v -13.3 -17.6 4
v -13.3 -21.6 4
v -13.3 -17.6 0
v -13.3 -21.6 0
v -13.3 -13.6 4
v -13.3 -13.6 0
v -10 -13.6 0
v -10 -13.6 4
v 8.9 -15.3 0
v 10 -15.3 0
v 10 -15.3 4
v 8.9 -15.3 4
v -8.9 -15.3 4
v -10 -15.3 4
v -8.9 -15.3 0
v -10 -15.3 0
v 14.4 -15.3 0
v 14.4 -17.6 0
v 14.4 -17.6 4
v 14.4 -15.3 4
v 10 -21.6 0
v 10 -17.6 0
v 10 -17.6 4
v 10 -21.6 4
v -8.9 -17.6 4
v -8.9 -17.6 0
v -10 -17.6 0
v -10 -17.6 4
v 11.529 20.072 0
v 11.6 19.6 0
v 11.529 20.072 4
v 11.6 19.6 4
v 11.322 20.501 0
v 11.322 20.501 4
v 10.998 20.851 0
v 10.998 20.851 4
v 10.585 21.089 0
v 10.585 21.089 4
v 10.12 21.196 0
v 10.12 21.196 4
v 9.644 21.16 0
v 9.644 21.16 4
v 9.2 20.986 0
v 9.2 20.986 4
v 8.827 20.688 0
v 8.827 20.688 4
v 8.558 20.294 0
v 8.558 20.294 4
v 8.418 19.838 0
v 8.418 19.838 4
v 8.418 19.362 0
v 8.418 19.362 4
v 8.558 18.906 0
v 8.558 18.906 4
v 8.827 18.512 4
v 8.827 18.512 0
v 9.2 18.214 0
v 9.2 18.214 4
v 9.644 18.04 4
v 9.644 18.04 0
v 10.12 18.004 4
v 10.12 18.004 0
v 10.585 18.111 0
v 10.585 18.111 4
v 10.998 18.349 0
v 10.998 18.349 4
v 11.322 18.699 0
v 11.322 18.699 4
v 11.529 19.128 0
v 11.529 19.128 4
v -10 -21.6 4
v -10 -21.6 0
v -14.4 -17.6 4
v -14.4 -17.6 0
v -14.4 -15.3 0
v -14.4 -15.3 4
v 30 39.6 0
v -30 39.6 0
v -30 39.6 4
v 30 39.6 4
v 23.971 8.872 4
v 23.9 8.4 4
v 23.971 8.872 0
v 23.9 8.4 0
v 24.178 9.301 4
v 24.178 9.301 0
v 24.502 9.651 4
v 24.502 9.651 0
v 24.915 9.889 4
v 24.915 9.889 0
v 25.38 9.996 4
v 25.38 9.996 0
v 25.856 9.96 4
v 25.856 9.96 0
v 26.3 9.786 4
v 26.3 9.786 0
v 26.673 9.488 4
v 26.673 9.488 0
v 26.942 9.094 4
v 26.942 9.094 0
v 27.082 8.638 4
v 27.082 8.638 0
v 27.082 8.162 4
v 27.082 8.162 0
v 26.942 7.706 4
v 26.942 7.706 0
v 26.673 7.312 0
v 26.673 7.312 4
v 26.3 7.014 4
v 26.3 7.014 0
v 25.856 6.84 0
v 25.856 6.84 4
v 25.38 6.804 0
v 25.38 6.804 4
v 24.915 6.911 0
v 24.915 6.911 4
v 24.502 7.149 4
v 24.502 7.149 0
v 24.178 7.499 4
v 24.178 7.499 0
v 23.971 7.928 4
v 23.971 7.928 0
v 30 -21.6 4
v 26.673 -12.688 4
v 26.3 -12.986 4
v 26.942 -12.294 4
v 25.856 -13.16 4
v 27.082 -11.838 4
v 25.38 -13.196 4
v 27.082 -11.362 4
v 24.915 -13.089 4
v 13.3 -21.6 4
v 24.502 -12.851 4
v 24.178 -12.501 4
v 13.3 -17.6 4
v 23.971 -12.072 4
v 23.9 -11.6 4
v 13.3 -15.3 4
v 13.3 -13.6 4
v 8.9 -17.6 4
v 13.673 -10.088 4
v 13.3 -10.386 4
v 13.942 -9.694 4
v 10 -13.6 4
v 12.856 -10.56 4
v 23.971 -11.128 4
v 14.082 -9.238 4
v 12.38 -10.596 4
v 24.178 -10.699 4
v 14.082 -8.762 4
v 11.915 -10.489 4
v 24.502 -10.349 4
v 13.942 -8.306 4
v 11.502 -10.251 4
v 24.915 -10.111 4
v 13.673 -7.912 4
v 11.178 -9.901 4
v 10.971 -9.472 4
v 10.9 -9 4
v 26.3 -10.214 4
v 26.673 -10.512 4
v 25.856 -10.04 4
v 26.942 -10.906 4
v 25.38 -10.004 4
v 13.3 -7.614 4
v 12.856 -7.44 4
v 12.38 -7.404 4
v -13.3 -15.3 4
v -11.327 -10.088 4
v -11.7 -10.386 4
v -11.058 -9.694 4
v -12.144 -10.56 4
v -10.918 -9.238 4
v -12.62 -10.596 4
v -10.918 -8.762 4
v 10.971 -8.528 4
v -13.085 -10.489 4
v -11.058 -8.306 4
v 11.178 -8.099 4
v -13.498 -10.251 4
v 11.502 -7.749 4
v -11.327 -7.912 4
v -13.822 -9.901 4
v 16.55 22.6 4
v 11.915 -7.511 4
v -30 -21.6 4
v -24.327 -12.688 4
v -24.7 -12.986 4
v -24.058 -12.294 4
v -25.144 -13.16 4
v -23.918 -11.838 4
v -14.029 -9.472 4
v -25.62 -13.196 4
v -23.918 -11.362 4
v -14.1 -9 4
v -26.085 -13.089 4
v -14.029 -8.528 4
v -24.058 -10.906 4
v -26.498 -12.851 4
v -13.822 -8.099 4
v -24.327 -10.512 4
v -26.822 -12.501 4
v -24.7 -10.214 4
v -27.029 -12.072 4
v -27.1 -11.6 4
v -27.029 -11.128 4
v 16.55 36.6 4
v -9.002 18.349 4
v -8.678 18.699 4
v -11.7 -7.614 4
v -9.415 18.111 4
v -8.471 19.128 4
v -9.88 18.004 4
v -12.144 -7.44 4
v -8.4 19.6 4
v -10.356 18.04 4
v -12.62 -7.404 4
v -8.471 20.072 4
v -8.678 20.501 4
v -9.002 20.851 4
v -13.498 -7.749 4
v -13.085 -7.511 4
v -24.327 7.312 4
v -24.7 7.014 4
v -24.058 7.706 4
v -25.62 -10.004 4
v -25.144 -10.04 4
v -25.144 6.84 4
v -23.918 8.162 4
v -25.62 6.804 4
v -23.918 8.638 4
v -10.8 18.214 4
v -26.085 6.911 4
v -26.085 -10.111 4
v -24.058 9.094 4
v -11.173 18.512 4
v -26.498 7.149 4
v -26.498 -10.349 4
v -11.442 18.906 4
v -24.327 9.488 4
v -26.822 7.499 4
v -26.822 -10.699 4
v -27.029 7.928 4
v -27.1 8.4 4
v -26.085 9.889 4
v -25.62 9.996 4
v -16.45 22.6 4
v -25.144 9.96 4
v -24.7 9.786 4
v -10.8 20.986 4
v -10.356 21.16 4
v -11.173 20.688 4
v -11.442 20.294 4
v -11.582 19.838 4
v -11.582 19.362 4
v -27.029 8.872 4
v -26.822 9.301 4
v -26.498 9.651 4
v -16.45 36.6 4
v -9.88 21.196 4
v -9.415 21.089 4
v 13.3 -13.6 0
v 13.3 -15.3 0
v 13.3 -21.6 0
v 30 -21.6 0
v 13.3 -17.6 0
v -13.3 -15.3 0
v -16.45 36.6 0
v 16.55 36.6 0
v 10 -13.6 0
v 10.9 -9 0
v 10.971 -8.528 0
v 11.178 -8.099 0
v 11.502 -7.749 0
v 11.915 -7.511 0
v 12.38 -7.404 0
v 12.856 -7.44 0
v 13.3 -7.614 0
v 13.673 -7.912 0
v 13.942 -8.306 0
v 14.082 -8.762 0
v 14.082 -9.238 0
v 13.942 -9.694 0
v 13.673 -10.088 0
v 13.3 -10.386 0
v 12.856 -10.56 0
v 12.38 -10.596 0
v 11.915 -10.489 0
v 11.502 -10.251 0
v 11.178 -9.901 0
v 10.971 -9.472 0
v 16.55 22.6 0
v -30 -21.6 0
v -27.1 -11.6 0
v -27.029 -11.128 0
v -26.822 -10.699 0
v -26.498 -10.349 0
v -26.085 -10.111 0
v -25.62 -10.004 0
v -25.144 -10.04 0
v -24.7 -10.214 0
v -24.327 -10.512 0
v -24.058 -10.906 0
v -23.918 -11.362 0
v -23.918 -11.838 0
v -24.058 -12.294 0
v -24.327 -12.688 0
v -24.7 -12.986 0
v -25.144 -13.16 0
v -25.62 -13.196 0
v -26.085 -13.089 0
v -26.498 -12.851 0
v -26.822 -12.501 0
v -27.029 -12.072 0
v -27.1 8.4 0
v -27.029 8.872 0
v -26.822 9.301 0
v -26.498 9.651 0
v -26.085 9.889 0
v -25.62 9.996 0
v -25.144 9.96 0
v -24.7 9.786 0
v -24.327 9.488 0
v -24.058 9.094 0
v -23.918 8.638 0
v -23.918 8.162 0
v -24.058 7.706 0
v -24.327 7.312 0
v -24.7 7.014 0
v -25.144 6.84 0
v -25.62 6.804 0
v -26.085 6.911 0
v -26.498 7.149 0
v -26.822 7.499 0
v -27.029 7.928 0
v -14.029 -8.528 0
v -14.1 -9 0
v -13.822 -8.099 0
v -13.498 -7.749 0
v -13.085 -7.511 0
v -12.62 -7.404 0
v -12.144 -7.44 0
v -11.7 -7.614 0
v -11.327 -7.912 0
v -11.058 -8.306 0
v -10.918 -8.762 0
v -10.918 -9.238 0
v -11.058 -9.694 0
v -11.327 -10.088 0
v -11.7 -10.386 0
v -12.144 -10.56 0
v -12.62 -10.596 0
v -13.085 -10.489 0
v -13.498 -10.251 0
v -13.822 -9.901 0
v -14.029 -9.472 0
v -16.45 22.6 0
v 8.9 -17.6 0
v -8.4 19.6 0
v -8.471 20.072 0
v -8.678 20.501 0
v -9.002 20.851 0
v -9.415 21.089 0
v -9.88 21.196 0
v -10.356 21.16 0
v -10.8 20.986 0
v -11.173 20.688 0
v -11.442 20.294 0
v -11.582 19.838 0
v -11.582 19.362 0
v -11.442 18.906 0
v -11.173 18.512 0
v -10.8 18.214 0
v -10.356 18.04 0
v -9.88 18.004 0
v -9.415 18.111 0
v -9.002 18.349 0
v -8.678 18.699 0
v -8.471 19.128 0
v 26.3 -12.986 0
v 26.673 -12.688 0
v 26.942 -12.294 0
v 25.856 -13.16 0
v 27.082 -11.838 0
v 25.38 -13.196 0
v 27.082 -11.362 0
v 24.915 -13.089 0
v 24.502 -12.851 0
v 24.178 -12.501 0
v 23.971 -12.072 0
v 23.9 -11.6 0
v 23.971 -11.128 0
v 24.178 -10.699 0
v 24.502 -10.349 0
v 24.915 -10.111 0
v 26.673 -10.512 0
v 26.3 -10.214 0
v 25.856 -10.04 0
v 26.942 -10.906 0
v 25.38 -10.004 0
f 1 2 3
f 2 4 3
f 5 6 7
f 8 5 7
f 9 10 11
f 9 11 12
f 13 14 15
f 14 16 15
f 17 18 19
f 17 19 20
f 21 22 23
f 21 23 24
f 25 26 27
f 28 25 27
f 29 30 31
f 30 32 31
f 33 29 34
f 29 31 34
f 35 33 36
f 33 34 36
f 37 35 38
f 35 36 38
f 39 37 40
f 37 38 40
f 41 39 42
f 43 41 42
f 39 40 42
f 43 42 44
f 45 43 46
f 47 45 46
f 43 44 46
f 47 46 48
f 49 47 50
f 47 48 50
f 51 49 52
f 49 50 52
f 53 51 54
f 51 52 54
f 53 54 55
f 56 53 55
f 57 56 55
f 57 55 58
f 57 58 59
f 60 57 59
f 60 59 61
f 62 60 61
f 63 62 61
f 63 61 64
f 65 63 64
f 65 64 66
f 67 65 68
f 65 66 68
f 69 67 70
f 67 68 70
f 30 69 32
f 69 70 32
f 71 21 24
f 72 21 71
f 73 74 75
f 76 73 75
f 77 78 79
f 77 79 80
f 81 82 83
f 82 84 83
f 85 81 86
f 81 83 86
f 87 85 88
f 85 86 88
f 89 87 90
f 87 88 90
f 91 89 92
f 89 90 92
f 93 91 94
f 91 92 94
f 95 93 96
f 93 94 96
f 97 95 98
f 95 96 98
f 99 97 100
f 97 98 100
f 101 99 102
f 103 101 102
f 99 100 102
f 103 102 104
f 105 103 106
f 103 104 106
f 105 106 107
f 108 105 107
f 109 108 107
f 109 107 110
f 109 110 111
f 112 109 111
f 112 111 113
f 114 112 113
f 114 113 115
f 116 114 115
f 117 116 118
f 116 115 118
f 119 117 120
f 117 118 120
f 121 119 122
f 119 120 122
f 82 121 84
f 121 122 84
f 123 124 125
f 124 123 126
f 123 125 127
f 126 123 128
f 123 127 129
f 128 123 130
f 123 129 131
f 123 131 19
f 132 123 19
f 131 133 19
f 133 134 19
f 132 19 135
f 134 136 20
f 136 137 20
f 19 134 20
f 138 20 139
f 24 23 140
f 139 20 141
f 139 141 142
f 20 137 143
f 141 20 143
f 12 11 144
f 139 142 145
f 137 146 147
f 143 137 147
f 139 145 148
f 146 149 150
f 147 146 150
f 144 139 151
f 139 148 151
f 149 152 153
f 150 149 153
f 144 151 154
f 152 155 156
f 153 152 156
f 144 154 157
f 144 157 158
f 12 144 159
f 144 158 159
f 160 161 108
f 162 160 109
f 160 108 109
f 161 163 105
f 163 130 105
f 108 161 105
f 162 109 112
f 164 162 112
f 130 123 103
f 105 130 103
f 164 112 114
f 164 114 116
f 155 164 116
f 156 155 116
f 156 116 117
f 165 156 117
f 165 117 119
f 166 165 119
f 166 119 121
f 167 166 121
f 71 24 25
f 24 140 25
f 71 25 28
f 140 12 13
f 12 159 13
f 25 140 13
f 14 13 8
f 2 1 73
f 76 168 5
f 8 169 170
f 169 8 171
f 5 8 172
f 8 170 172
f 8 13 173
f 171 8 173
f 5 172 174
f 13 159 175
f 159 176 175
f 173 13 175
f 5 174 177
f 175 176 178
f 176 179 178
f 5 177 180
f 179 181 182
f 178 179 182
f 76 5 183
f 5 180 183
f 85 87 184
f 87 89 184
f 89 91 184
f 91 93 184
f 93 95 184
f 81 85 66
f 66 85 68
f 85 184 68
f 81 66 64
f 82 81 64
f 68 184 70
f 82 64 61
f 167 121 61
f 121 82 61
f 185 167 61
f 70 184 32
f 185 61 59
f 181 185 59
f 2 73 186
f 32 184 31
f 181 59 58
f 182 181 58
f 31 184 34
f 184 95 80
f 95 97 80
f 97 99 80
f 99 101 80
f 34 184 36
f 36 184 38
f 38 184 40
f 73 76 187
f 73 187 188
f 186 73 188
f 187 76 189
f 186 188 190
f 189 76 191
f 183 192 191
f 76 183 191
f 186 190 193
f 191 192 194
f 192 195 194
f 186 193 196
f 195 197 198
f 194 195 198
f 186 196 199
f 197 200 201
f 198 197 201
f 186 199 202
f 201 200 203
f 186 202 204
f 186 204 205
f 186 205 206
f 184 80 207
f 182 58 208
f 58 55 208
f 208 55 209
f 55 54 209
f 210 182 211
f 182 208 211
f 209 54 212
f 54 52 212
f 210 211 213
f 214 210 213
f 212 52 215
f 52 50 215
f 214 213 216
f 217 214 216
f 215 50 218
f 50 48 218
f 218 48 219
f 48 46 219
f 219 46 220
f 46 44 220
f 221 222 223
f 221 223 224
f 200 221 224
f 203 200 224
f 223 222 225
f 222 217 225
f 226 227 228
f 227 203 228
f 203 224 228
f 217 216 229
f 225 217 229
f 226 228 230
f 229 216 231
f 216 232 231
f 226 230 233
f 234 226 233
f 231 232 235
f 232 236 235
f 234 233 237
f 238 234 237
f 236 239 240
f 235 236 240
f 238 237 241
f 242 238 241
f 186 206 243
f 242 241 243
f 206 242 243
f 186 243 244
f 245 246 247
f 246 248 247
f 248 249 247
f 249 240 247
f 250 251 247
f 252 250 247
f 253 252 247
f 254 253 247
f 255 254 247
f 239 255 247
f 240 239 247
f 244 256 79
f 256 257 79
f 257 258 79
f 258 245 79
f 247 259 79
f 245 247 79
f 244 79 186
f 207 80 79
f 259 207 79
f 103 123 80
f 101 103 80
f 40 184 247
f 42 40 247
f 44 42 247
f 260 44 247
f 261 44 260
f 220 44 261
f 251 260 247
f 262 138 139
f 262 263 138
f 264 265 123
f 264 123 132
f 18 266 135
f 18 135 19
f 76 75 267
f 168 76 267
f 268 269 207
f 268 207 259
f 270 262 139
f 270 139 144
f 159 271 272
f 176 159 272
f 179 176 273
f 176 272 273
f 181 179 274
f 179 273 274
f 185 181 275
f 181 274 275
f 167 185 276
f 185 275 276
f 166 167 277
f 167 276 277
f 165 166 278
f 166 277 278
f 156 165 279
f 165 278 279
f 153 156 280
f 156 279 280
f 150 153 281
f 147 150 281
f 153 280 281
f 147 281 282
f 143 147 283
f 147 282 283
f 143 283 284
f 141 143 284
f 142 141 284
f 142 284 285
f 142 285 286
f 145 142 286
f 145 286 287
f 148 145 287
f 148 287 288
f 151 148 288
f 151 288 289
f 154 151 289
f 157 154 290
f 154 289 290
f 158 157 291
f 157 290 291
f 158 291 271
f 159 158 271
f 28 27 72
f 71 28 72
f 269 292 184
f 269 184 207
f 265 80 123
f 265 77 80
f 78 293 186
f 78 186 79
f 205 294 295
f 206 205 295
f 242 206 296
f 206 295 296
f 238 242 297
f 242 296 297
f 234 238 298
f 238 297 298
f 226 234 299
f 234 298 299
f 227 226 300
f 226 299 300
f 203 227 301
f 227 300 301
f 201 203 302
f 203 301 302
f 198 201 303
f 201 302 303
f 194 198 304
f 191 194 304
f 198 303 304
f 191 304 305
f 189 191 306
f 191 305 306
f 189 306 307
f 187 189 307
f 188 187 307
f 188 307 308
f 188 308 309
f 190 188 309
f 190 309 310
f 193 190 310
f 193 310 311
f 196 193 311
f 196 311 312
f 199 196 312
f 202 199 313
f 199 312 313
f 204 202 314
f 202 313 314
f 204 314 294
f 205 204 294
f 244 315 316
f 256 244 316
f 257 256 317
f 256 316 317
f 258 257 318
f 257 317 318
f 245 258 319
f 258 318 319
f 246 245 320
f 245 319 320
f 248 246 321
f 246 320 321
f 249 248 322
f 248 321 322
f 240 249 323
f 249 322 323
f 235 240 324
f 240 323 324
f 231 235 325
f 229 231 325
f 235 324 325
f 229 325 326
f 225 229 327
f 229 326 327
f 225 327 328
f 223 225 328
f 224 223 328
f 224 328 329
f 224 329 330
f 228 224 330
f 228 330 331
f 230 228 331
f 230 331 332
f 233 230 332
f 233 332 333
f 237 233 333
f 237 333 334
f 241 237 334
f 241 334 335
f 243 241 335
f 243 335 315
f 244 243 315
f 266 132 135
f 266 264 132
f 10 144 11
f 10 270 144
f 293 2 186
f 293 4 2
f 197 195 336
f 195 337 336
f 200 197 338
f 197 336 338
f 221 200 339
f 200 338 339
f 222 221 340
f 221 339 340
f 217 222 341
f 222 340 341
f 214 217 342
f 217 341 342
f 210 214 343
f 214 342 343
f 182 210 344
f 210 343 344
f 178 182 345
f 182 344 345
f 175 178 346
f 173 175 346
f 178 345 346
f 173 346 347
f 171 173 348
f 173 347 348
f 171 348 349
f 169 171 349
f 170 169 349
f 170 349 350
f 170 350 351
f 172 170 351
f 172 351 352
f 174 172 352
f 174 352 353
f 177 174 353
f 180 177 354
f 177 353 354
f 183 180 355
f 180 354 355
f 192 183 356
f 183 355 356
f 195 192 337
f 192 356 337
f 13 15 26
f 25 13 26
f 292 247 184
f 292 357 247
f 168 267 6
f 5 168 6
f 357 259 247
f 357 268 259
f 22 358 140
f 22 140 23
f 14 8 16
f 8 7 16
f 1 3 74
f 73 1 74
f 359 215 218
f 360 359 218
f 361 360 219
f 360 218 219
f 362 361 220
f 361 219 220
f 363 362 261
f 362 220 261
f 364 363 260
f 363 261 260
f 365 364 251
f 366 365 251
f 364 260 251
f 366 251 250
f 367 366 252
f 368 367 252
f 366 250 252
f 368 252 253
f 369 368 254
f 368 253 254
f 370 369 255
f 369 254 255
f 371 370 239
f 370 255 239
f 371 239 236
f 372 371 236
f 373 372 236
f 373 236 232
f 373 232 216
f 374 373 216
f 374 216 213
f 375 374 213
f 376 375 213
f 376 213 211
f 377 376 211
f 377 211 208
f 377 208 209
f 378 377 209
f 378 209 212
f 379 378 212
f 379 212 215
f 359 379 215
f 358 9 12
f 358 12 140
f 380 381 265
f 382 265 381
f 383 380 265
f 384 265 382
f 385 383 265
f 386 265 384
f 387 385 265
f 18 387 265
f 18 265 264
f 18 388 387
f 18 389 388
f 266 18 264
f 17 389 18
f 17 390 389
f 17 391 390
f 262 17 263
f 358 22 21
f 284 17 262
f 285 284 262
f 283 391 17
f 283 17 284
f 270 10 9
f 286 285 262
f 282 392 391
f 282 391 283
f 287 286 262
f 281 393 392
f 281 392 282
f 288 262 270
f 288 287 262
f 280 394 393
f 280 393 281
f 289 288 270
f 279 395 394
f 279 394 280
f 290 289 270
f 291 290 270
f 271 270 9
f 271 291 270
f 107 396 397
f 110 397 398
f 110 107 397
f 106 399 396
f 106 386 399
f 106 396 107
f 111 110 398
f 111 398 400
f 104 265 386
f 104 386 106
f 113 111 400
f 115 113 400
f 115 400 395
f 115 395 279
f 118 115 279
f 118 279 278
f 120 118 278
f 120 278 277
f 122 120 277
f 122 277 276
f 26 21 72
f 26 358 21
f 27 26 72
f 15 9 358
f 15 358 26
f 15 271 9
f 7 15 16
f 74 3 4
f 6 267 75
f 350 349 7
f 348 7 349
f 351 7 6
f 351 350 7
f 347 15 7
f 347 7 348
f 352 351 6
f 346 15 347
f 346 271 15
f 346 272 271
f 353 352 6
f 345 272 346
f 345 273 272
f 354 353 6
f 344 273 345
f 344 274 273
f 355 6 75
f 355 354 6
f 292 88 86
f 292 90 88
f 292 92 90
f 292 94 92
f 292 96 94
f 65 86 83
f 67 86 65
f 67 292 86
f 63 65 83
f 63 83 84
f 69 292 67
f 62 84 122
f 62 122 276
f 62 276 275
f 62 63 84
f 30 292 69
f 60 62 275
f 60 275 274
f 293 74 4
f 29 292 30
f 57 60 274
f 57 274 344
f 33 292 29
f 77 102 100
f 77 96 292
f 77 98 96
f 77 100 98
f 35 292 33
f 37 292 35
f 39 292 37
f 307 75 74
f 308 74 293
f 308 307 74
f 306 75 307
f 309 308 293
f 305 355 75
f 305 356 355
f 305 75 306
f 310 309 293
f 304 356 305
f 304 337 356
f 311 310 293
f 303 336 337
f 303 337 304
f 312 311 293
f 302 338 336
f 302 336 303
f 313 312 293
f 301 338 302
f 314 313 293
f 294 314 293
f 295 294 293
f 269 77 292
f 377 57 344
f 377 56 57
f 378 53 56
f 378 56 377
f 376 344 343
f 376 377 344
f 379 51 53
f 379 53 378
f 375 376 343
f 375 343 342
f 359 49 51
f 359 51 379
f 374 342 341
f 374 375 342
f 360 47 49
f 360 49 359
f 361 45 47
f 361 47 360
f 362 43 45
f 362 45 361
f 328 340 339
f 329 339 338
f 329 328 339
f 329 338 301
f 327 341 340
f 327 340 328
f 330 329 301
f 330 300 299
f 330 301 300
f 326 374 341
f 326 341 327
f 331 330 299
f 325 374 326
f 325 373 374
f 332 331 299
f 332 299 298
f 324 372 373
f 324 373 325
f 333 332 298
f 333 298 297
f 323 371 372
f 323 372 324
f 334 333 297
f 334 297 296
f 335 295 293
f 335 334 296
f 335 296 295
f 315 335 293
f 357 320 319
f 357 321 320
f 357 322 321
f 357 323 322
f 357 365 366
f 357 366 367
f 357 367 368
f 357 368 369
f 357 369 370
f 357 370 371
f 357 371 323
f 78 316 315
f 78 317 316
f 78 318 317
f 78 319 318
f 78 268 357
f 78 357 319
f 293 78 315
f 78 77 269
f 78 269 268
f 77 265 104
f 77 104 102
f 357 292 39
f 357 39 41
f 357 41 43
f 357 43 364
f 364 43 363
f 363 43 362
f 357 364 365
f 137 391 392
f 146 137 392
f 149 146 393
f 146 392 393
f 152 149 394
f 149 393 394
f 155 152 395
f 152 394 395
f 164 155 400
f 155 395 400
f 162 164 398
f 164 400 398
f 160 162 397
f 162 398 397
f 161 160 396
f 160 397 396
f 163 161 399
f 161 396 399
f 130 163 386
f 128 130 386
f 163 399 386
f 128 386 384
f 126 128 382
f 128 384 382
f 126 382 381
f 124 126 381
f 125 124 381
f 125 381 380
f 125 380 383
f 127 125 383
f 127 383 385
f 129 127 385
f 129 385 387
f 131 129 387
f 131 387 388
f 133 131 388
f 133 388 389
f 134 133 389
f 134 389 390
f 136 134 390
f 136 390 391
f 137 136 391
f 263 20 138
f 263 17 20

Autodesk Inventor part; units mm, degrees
ref_plane "YZ Plane" through (0, 0, 0) normal (1, 0, 0) x (0, 1, 0)
ref_plane "XZ Plane" through (0, 0, 0) normal (0, 1, 0) x (-1, 0, 0)
ref_plane "XY Plane" through (0, 0, 0) normal (0, 0, 1) x (1, 0, 0)
sketch "Эскиз1" plane through (0, 0, 0) normal (0, 0, 1) x (1, 0, 0)
  line L0 (-30, 21.6) -> (30, 21.6)
  line L1 (30, 21.6) -> (30, -21.6)
  line L2 (30, -21.6) -> (-30, -21.6)
  line L3 (-30, -21.6) -> (-30, 21.6)
  line L4 (-30, 21.6) -> (30, -21.6) construction
  line L5 (30, 21.6) -> (-30, -21.6) construction
  point P0 (0, 0)
  dimension "d0" = 60
  dimension "d1" = 43.2
extrude "Выдавливание1" add sketch "Эскиз1" along normal blind 4
sketch "Эскиз2" plane through (0, 0, 0) normal (0, 0, -1) x (-1, 0, 0)
  line L0 (-12.5, -9) -> (12.5, -9) construction
  line L1 (0, 0) -> (0, -21.6) construction
  line L2 (30, -21.6) -> (-30, -21.6) projected
  circle A0 centre (-12.5, -9) radius 1.6
  circle A1 centre (12.5, -9) radius 1.6
  line L3 (-30, -21.6) -> (-30, 21.6) projected
  line L4 (-30, 0) -> (30, 0) construction
  line L5 (30, 21.6) -> (30, -21.6) projected
  point P0 (0, -9)
  dimension "d4" = 25
  dimension "d5" = 3.2
  dimension "d6" = 3.2
  dimension "d7" = 9
extrude "Выдавливание2" cut sketch "Эскиз2" against normal blind 4
sketch "Эскиз3" plane through (0, 0, 0) normal (0, 0, -1) x (-1, 0, 0)
  circle A0 centre (-25.5, 8.4) radius 1.75 construction
  circle A1 centre (25.5, 8.4) radius 1.75 construction
  circle A2 centre (25.5, -11.6) radius 1.75 construction
  circle A3 centre (-25.5, -11.6) radius 1.75 construction
  circle A4 centre (-25.5, 8.4) radius 1.6
  circle A5 centre (25.5, 8.4) radius 1.6
  circle A6 centre (-25.5, -11.6) radius 1.6
  circle A7 centre (25.5, -11.6) radius 1.6
  point P0 (0, 0)
  dimension "d10" = 3.2
  dimension "d11" = 3.2
  dimension "d12" = 3.2
  dimension "d13" = 3.2
extrude "Выдавливание3" cut sketch "Эскиз3" against normal blind 10
sketch "Эскиз4" plane through (0, 0, 0) normal (0, 0, -1) x (-1, 0, 0)
  line L0 (-30, 21.6) -> (30, 21.6) construction
  line L1 (-30, 21.6) -> (30, 21.6) projected
  line L2 (-30, 21.6) -> (30, 21.6)
  line L3 (30, 21.6) -> (30, 39.6)
  line L4 (30, 39.6) -> (-30, 39.6)
  line L5 (-30, 39.6) -> (-30, 21.6)
  dimension "d18" = 60
  dimension "d19" = 18
extrude "Выдавливание4" add sketch "Эскиз4" against normal blind 4
sketch "Эскиз5" plane through (0, 0, 0) normal (0, 0, -1) x (-1, 0, 0)
  line L0 (-11.55, 23.6) -> (11.45, 23.6) construction
  line L1 (11.45, 23.6) -> (11.45, 35.6) construction
  line L2 (-11.55, 23.6) -> (11.45, 35.6) construction
  line L3 (-16.55, 36.6) -> (16.45, 36.6)
  line L4 (16.45, 36.6) -> (16.45, 22.6)
  line L5 (16.45, 22.6) -> (-16.55, 22.6)
  line L6 (-16.55, 22.6) -> (-16.55, 36.6)
  line L7 (-16.55, 36.6) -> (16.45, 22.6) construction
  line L8 (16.45, 36.6) -> (-16.55, 22.6) construction
  point P0 (0, 0)
  point P1 (-0.05, 29.6)
  dimension "d22" = 1
  dimension "d23" = 5
extrude "Выдавливание5" cut sketch "Эскиз5" against normal blind 4
sketch "Эскиз6" plane through (0, 0, 4) normal (0, 0, 1) x (1, 0, 0)
  line L0 (11.7, 17.6) -> (11.7, 21.6) construction
  line L1 (11.7, 21.6) -> (30, 21.6) construction
  line L2 (30, 21.6) -> (30, 17.6) construction
  line L3 (30, 17.6) -> (11.7, 17.6) construction
  line L4 (-8.3, 17.6) -> (-8.3, 21.6) construction
  line L5 (-8.3, 21.6) -> (8.3, 21.6) construction
  line L6 (8.3, 21.6) -> (8.3, 17.6) construction
  line L7 (8.3, 17.6) -> (-8.3, 17.6) construction
  line L8 (-11.7, 21.6) -> (-11.7, 17.6) construction
  line L9 (-11.7, 17.6) -> (-30, 17.6) construction
  line L10 (-30, 17.6) -> (-30, 21.6) construction
  line L11 (-30, 21.6) -> (-11.7, 21.6) construction
  line L12 (11.7, 21.6) -> (8.3, 17.6) construction
  line L13 (-8.3, 21.6) -> (-11.7, 17.6) construction
  circle A0 centre (-10, 19.6) radius 1.6
  circle A1 centre (10, 19.6) radius 1.6
  point P0 (0, 0)
  dimension "d26" = 3.2
  dimension "d27" = 3.2
extrude "Выдавливание6" cut sketch "Эскиз6" against normal blind 10
sketch "Эскиз7" plane through (0, 0, 0) normal (0, 0, -1) x (-1, 0, 0)
  line L0 (-10, -21.6) -> (-13.3, -21.6)
  line L1 (-13.3, -21.6) -> (-13.3, -13.6)
  line L2 (-13.3, -13.6) -> (-10, -13.6)
  line L3 (-10, -13.6) -> (-10, -21.6)
  line L4 (-20, -21.6) -> (20, -21.6) projected
  line L5 (30, -21.6) -> (-30, -21.6) projected
  line L6 (-8.9, -17.6) -> (-14.4, -17.6)
  line L7 (-14.4, -17.6) -> (-14.4, -15.3)
  line L8 (-14.4, -15.3) -> (-8.9, -15.3)
  line L9 (-8.9, -15.3) -> (-8.9, -17.6)
  line L10 (-11.65, -13.6) -> (-11.65, -21.6) construction
  line L11 (0, -21.6) -> (0, -16.45)
  line L12 (10, -21.6) -> (13.3, -21.6)
  line L13 (13.3, -21.6) -> (13.3, -13.6)
  line L14 (13.3, -13.6) -> (10, -13.6)
  line L15 (10, -13.6) -> (10, -21.6)
  line L16 (8.9, -17.6) -> (14.4, -17.6)
  line L17 (14.4, -17.6) -> (14.4, -15.3)
  line L18 (14.4, -15.3) -> (8.9, -15.3)
  line L19 (8.9, -15.3) -> (8.9, -17.6)
  line L20 (11.65, -13.6) -> (11.65, -21.6) construction
  point P0 (0, 0)
  point P1 (-11.65, -15.3)
  point P2 (11.65, -15.3)
  point P3 (-13.3, -17.6)
  point P4 (-10, -17.6)
  point P5 (-10, -15.3)
  point P6 (-13.3, -15.3)
  point P7 (13.3, -15.3)
  point P8 (10, -15.3)
  point P9 (10, -17.6)
  point P10 (10, -21.6)
  point P11 (13.3, -21.6)
  point P12 (13.3, -17.6)
  dimension "d30" = 3.3
  dimension "d31" = 8
  dimension "d32" = 10
  dimension "d33" = 5.5
  dimension "d34" = 2.3
  dimension "d35" = 4
extrude "Выдавливание7" cut sketch "Эскиз7" against normal blind 4
properties part number "стена_для_рельс"
